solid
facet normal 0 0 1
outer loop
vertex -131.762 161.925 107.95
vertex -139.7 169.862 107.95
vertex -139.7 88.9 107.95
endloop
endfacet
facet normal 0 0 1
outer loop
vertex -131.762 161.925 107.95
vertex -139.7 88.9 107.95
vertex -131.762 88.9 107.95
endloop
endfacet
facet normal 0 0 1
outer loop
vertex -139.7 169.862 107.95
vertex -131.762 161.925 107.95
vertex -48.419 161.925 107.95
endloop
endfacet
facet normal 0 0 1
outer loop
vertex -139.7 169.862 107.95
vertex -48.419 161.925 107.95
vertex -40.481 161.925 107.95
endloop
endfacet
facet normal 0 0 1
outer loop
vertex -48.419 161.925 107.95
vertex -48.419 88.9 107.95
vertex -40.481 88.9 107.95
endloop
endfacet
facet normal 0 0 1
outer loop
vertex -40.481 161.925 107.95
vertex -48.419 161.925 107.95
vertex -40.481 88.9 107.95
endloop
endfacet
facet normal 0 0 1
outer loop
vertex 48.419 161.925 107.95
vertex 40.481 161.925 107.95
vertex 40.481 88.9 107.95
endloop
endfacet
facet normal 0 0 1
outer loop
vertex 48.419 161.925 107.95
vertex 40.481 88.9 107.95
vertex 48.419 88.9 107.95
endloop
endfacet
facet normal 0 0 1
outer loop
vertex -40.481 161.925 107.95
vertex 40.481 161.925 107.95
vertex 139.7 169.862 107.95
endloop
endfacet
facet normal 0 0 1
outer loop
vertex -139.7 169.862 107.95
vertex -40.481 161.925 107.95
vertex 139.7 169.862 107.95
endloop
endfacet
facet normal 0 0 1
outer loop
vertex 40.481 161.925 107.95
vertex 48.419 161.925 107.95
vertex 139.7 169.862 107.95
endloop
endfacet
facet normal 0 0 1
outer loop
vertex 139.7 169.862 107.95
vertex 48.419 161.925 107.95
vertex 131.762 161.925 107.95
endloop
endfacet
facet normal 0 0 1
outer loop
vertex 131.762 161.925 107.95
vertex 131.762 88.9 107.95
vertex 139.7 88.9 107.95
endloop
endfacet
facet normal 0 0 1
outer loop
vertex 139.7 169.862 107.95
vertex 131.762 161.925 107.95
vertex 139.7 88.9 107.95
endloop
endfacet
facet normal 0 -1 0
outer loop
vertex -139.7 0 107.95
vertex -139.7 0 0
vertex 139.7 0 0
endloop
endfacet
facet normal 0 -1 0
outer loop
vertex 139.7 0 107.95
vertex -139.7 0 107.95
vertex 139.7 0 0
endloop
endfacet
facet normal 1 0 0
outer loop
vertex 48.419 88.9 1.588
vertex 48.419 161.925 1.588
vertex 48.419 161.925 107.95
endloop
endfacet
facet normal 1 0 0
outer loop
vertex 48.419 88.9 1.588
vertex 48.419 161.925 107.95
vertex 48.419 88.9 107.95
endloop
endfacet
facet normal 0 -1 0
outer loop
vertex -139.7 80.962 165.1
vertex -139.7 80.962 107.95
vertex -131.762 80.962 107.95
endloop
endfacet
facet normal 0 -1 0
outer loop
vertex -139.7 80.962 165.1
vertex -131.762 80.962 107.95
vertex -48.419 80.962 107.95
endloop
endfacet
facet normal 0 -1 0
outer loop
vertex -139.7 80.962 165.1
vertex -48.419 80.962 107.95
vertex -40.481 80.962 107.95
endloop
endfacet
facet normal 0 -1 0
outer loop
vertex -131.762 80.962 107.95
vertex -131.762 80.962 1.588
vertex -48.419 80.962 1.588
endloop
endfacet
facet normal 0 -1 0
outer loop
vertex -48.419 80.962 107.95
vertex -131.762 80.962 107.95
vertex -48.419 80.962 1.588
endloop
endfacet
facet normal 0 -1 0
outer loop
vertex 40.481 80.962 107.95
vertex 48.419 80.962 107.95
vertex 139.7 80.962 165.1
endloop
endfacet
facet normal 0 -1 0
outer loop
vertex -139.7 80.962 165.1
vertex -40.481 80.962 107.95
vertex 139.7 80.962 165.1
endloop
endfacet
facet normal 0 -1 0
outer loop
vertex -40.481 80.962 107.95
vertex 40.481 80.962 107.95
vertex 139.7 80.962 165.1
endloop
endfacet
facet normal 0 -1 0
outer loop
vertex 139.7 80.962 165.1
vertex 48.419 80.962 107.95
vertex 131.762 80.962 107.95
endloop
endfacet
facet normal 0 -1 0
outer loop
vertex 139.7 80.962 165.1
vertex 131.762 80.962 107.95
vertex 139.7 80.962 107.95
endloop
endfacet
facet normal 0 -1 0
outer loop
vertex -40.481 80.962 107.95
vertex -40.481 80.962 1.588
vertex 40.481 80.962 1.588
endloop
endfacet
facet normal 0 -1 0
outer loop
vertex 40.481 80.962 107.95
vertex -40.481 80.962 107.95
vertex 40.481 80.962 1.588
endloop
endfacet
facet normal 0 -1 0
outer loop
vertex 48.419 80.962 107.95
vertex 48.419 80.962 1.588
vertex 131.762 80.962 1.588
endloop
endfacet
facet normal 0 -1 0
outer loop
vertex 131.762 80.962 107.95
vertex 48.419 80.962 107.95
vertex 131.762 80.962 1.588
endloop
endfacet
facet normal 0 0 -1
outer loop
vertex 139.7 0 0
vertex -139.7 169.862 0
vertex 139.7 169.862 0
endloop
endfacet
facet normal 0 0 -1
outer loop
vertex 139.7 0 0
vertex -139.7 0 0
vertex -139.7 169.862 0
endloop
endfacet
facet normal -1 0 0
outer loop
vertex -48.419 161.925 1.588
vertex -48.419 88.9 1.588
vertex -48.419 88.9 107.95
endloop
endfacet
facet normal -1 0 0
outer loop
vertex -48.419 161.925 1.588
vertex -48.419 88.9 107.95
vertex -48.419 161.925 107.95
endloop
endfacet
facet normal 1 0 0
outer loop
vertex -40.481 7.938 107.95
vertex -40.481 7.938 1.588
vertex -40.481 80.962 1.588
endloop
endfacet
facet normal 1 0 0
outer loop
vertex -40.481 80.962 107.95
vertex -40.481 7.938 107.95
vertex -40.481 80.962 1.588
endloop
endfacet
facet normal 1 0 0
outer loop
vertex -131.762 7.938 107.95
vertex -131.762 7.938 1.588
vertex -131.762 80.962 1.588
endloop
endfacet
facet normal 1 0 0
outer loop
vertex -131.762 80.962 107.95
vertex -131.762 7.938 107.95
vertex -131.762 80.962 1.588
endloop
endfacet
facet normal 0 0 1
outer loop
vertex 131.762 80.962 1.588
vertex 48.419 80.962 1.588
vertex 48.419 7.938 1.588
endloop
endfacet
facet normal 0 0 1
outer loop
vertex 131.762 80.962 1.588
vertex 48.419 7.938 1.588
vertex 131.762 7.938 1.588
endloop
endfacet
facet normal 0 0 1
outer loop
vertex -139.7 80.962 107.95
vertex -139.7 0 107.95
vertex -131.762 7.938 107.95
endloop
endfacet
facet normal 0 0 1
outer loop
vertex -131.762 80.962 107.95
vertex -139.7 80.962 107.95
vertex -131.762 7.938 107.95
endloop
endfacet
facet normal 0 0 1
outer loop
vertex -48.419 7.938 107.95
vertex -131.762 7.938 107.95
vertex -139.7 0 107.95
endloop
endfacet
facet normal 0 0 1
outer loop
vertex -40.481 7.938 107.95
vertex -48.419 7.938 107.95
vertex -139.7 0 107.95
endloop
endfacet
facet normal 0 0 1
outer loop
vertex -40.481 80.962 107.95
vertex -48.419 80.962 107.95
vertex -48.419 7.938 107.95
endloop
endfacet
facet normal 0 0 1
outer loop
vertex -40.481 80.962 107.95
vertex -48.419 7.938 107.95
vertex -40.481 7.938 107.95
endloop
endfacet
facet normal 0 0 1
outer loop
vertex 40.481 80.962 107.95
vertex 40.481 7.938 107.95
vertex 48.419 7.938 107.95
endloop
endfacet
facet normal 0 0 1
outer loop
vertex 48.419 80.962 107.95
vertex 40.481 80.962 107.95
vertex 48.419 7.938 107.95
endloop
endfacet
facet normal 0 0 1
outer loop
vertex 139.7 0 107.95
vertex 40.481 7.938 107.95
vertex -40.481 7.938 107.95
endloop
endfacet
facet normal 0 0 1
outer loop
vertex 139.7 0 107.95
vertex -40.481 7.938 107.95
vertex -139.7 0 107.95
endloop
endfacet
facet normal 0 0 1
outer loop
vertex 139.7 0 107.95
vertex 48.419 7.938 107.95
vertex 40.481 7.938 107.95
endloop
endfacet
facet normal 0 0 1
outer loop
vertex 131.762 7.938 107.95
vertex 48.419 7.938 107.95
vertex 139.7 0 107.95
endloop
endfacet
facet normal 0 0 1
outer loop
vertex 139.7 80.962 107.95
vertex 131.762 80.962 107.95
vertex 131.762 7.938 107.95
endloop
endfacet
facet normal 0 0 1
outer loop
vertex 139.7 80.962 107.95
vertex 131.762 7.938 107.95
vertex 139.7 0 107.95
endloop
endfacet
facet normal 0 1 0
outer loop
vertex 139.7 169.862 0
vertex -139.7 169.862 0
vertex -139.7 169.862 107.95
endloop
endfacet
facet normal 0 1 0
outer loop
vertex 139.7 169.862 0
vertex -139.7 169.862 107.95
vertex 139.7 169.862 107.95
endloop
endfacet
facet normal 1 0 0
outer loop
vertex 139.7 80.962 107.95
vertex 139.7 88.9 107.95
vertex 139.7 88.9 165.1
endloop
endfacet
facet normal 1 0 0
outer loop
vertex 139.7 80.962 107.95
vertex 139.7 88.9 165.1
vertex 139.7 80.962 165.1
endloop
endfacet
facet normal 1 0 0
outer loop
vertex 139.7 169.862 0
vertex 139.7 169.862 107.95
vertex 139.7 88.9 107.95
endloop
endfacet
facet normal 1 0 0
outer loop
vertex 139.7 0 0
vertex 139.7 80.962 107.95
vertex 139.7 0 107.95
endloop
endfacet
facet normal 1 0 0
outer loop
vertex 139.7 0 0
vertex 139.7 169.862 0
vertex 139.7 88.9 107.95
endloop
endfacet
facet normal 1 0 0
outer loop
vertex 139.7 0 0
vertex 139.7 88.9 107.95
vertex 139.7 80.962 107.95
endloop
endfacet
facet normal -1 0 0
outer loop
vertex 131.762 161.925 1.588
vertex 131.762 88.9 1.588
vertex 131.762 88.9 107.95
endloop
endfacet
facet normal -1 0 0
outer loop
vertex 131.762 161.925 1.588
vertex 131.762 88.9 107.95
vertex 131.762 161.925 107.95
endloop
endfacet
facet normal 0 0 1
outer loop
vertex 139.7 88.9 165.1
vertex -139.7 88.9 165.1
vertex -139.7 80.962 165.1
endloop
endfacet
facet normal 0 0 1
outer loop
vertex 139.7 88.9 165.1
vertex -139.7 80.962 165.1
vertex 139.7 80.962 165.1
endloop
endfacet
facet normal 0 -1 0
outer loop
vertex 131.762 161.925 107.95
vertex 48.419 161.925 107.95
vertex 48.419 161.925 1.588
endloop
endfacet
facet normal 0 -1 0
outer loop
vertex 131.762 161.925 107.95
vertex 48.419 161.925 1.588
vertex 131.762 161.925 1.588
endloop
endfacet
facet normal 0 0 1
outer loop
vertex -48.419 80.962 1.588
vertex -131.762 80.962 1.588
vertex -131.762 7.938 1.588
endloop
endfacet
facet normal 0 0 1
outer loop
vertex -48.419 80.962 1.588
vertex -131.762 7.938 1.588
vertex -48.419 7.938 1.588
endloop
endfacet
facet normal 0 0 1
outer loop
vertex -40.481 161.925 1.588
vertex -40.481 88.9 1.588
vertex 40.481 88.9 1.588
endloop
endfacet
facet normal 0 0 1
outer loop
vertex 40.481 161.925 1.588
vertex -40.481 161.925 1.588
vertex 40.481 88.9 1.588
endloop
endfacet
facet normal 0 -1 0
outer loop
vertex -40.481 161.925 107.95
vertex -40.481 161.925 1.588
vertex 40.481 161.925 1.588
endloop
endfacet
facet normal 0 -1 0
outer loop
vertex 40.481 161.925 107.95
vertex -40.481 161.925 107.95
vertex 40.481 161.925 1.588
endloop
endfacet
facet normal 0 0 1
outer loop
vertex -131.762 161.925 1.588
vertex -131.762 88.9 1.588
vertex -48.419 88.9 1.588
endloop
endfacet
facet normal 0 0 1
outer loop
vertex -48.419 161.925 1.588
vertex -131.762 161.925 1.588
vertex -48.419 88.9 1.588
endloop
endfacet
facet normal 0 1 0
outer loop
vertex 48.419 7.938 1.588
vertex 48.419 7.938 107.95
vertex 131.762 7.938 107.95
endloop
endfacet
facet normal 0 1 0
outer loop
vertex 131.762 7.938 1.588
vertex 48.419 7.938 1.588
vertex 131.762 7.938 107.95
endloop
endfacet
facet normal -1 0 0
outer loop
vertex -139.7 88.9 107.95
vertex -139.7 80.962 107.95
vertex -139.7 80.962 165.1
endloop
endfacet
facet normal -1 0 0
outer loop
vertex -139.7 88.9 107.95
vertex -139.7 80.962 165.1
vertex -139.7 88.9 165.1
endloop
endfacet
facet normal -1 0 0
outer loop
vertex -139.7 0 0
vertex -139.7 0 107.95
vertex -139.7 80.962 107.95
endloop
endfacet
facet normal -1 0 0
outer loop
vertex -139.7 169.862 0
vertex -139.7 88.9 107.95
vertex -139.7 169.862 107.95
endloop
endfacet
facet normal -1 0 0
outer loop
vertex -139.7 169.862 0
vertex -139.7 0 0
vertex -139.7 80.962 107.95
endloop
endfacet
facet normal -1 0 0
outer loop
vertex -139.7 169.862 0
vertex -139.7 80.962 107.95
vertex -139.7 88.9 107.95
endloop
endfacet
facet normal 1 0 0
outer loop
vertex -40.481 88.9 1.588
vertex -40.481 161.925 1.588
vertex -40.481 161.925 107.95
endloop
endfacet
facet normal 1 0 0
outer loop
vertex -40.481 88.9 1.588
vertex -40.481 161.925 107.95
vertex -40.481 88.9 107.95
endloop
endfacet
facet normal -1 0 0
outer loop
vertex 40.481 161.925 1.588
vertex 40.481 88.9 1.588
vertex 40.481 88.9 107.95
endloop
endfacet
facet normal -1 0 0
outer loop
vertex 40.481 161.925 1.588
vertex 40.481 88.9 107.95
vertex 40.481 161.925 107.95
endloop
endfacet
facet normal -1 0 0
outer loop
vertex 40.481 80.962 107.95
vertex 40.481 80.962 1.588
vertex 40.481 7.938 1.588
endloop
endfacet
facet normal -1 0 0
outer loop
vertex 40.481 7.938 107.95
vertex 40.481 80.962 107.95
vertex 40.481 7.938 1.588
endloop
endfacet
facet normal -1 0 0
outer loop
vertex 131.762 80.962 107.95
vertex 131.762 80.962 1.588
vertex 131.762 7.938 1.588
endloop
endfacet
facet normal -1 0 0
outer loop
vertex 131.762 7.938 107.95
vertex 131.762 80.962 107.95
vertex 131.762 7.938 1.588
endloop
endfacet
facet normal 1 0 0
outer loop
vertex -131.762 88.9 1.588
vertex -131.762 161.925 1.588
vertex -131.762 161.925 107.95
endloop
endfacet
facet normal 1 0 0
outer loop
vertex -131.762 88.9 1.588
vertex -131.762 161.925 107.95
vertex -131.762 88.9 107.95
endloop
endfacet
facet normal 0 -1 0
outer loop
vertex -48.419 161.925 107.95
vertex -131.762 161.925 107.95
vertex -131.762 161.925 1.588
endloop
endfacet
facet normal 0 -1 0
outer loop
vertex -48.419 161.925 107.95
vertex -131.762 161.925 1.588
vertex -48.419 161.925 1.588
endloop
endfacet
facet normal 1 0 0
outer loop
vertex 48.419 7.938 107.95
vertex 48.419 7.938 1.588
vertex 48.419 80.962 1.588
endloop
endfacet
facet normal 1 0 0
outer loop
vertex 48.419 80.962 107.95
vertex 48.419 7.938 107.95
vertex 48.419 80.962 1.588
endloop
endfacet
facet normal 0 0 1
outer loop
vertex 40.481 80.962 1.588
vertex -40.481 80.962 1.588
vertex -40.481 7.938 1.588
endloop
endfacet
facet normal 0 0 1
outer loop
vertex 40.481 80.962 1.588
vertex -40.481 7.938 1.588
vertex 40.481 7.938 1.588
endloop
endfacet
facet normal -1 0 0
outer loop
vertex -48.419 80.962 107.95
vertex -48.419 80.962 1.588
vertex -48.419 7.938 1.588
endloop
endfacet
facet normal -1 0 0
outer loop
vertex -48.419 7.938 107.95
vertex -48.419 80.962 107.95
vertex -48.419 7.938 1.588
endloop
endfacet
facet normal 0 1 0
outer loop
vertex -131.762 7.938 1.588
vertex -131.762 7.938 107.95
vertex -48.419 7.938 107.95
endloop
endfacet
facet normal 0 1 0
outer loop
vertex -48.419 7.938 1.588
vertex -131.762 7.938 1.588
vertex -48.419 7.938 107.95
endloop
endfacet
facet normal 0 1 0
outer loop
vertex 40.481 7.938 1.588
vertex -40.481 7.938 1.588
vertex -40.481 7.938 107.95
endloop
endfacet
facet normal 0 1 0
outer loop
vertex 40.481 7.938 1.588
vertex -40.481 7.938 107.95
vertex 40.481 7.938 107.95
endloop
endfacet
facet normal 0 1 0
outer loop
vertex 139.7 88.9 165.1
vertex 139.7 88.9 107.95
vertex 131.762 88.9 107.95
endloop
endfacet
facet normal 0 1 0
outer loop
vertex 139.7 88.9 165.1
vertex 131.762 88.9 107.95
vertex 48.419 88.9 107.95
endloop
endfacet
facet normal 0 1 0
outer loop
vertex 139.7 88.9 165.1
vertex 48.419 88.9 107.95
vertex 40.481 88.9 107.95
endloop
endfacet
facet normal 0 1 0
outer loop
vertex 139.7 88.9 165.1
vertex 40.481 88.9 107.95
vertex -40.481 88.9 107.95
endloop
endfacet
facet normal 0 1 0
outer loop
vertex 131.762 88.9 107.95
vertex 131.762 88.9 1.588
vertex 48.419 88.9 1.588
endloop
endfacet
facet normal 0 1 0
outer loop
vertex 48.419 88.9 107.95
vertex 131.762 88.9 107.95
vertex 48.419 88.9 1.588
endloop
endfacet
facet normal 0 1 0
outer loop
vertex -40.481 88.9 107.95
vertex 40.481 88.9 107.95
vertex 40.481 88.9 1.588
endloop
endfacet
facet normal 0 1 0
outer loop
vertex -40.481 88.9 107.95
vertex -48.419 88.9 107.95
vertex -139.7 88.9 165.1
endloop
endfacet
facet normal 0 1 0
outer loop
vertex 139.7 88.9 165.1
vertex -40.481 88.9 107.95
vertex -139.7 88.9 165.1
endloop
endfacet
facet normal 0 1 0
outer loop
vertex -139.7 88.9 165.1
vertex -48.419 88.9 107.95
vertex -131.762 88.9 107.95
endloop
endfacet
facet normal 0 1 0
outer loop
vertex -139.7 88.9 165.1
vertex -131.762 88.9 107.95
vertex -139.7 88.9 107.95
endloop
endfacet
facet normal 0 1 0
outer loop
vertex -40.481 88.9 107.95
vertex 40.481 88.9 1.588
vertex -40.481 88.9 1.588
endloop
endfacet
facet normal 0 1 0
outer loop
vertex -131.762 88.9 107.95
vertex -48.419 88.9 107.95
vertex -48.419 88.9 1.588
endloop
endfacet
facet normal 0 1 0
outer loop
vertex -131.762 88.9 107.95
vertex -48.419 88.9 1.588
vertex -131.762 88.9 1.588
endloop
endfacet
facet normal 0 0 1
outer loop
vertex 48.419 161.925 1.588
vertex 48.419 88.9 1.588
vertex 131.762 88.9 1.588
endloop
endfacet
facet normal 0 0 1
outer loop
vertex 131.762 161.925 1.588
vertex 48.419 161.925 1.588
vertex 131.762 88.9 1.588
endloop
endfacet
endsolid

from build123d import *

# Parameters (mm, degrees)
F0_W     = 83.34375
F0_H     = 7.9375
F0_W_2   = 80.9625
F0_W_3   = 7.9375
F1_DEPTH = 165.1
F0_H_2   = 73.025
F2_DEPTH = 1.5875
F3_DEPTH = 107.95


with BuildPart() as f1:
    # F0 (on Top) → F1 (new body)
    with BuildSketch(Plane.XY):
        with Locations((-90.090625, 84.93125)):
            Rectangle(F0_W, F0_H)
        with Locations((0, 84.93125)):
            Rectangle(F0_W_2, F0_H)
        Polygon((-48.41875, 88.9), (-48.41875, 80.9625), (-40.48125, 80.9625), (-40.48125, 88.9), (-44.45, 88.9), align=None)
        with Locations((-135.73125, 84.93125)):
            Rectangle(F0_W_3, F0_H)
        Polygon((40.48125, 88.9), (40.48125, 80.9625), (48.41875, 80.9625), (48.41875, 88.9), (44.45, 88.9), align=None)
        with Locations((90.090625, 84.93125)):
            Rectangle(F0_W, F0_H)
        with Locations((135.73125, 84.93125)):
            Rectangle(F0_W_3, F0_H)
    extrude(amount=F1_DEPTH)


with BuildPart() as f2:
    # F0 (on Top) → F2 (new body)
    with BuildSketch(Plane.XY):
        with Locations((-90.090625, 44.45)):
            Rectangle(F0_W, F0_H_2)
    extrude(amount=F2_DEPTH)


with BuildPart() as f2b:
    # F0 (on Top) → F2, piece 2 (new body)
    with BuildSketch(Plane.XY):
        with Locations((0, 44.45)):
            Rectangle(F0_W_2, F0_H_2)
    extrude(amount=F2_DEPTH)


with BuildPart() as f2c:
    # F0 (on Top) → F2, piece 3 (new body)
    with BuildSketch(Plane.XY):
        with Locations((90.090625, 44.45)):
            Rectangle(F0_W, F0_H_2)
    extrude(amount=F2_DEPTH)


with BuildPart() as f3:
    # F0 (on Top) → F3 (new body)
    with BuildSketch(Plane.XY):
        Polygon((-48.41875, 88.9), (-48.41875, 80.9625), (-40.48125, 80.9625), (-40.48125, 88.9), (-44.45, 88.9), align=None)
        with Locations((-44.45, 44.45)):
            Rectangle(F0_W_3, F0_H_2)
        Polygon((-48.41875, 7.9375), (-48.41875, 0), (-44.45, 0), (-40.48125, 0), (-40.48125, 7.9375), align=None)
        Polygon((40.48125, 7.9375), (40.48125, 0), (44.45, 0), (48.41875, 0), (48.41875, 7.9375), align=None)
        with Locations((44.45, 44.45)):
            Rectangle(F0_W_3, F0_H_2)
        Polygon((40.48125, 88.9), (40.48125, 80.9625), (48.41875, 80.9625), (48.41875, 88.9), (44.45, 88.9), align=None)
        with Locations((135.73125, 44.45)):
            Rectangle(F0_W_3, F0_H_2)
        with Locations((-135.73125, 44.45)):
            Rectangle(F0_W_3, F0_H_2)
        with Locations((-90.090625, 3.96875)):
            Rectangle(F0_W, F0_H)
        Polygon((-139.7, 5.3547988646), (-139.7, 0), (-131.7625, 0), (-131.7625, 7.9375), (-139.7, 7.9375), align=None)
        with Locations((-135.73125, 84.93125)):
            Rectangle(F0_W_3, F0_H)
        with Locations((-90.090625, 84.93125)):
            Rectangle(F0_W, F0_H)
        with Locations((0, 84.93125)):
            Rectangle(F0_W_2, F0_H)
        with Locations((0, 3.96875)):
            Rectangle(F0_W_2, F0_H)
        with Locations((90.090625, 3.96875)):
            Rectangle(F0_W, F0_H)
        with Locations((135.73125, 3.96875)):
            Rectangle(F0_W_3, F0_H)
        with Locations((135.73125, 84.93125)):
            Rectangle(F0_W_3, F0_H)
        with Locations((90.090625, 84.93125)):
            Rectangle(F0_W, F0_H)
    extrude(amount=F3_DEPTH)


with BuildPart() as f1_1:
    add(f1.part)

    # F4: union F2c, F2, F3, F2b
    add(f2c.part)
    add(f2.part)
    add(f3.part)
    add(f2b.part)

    # F6: F1 across plane


with BuildPart() as f1_2:
    add(f1_1.part)
    add(f1_1.part.mirror(Plane.XZ.offset(-84.93125)))


solid = f1_2.part
